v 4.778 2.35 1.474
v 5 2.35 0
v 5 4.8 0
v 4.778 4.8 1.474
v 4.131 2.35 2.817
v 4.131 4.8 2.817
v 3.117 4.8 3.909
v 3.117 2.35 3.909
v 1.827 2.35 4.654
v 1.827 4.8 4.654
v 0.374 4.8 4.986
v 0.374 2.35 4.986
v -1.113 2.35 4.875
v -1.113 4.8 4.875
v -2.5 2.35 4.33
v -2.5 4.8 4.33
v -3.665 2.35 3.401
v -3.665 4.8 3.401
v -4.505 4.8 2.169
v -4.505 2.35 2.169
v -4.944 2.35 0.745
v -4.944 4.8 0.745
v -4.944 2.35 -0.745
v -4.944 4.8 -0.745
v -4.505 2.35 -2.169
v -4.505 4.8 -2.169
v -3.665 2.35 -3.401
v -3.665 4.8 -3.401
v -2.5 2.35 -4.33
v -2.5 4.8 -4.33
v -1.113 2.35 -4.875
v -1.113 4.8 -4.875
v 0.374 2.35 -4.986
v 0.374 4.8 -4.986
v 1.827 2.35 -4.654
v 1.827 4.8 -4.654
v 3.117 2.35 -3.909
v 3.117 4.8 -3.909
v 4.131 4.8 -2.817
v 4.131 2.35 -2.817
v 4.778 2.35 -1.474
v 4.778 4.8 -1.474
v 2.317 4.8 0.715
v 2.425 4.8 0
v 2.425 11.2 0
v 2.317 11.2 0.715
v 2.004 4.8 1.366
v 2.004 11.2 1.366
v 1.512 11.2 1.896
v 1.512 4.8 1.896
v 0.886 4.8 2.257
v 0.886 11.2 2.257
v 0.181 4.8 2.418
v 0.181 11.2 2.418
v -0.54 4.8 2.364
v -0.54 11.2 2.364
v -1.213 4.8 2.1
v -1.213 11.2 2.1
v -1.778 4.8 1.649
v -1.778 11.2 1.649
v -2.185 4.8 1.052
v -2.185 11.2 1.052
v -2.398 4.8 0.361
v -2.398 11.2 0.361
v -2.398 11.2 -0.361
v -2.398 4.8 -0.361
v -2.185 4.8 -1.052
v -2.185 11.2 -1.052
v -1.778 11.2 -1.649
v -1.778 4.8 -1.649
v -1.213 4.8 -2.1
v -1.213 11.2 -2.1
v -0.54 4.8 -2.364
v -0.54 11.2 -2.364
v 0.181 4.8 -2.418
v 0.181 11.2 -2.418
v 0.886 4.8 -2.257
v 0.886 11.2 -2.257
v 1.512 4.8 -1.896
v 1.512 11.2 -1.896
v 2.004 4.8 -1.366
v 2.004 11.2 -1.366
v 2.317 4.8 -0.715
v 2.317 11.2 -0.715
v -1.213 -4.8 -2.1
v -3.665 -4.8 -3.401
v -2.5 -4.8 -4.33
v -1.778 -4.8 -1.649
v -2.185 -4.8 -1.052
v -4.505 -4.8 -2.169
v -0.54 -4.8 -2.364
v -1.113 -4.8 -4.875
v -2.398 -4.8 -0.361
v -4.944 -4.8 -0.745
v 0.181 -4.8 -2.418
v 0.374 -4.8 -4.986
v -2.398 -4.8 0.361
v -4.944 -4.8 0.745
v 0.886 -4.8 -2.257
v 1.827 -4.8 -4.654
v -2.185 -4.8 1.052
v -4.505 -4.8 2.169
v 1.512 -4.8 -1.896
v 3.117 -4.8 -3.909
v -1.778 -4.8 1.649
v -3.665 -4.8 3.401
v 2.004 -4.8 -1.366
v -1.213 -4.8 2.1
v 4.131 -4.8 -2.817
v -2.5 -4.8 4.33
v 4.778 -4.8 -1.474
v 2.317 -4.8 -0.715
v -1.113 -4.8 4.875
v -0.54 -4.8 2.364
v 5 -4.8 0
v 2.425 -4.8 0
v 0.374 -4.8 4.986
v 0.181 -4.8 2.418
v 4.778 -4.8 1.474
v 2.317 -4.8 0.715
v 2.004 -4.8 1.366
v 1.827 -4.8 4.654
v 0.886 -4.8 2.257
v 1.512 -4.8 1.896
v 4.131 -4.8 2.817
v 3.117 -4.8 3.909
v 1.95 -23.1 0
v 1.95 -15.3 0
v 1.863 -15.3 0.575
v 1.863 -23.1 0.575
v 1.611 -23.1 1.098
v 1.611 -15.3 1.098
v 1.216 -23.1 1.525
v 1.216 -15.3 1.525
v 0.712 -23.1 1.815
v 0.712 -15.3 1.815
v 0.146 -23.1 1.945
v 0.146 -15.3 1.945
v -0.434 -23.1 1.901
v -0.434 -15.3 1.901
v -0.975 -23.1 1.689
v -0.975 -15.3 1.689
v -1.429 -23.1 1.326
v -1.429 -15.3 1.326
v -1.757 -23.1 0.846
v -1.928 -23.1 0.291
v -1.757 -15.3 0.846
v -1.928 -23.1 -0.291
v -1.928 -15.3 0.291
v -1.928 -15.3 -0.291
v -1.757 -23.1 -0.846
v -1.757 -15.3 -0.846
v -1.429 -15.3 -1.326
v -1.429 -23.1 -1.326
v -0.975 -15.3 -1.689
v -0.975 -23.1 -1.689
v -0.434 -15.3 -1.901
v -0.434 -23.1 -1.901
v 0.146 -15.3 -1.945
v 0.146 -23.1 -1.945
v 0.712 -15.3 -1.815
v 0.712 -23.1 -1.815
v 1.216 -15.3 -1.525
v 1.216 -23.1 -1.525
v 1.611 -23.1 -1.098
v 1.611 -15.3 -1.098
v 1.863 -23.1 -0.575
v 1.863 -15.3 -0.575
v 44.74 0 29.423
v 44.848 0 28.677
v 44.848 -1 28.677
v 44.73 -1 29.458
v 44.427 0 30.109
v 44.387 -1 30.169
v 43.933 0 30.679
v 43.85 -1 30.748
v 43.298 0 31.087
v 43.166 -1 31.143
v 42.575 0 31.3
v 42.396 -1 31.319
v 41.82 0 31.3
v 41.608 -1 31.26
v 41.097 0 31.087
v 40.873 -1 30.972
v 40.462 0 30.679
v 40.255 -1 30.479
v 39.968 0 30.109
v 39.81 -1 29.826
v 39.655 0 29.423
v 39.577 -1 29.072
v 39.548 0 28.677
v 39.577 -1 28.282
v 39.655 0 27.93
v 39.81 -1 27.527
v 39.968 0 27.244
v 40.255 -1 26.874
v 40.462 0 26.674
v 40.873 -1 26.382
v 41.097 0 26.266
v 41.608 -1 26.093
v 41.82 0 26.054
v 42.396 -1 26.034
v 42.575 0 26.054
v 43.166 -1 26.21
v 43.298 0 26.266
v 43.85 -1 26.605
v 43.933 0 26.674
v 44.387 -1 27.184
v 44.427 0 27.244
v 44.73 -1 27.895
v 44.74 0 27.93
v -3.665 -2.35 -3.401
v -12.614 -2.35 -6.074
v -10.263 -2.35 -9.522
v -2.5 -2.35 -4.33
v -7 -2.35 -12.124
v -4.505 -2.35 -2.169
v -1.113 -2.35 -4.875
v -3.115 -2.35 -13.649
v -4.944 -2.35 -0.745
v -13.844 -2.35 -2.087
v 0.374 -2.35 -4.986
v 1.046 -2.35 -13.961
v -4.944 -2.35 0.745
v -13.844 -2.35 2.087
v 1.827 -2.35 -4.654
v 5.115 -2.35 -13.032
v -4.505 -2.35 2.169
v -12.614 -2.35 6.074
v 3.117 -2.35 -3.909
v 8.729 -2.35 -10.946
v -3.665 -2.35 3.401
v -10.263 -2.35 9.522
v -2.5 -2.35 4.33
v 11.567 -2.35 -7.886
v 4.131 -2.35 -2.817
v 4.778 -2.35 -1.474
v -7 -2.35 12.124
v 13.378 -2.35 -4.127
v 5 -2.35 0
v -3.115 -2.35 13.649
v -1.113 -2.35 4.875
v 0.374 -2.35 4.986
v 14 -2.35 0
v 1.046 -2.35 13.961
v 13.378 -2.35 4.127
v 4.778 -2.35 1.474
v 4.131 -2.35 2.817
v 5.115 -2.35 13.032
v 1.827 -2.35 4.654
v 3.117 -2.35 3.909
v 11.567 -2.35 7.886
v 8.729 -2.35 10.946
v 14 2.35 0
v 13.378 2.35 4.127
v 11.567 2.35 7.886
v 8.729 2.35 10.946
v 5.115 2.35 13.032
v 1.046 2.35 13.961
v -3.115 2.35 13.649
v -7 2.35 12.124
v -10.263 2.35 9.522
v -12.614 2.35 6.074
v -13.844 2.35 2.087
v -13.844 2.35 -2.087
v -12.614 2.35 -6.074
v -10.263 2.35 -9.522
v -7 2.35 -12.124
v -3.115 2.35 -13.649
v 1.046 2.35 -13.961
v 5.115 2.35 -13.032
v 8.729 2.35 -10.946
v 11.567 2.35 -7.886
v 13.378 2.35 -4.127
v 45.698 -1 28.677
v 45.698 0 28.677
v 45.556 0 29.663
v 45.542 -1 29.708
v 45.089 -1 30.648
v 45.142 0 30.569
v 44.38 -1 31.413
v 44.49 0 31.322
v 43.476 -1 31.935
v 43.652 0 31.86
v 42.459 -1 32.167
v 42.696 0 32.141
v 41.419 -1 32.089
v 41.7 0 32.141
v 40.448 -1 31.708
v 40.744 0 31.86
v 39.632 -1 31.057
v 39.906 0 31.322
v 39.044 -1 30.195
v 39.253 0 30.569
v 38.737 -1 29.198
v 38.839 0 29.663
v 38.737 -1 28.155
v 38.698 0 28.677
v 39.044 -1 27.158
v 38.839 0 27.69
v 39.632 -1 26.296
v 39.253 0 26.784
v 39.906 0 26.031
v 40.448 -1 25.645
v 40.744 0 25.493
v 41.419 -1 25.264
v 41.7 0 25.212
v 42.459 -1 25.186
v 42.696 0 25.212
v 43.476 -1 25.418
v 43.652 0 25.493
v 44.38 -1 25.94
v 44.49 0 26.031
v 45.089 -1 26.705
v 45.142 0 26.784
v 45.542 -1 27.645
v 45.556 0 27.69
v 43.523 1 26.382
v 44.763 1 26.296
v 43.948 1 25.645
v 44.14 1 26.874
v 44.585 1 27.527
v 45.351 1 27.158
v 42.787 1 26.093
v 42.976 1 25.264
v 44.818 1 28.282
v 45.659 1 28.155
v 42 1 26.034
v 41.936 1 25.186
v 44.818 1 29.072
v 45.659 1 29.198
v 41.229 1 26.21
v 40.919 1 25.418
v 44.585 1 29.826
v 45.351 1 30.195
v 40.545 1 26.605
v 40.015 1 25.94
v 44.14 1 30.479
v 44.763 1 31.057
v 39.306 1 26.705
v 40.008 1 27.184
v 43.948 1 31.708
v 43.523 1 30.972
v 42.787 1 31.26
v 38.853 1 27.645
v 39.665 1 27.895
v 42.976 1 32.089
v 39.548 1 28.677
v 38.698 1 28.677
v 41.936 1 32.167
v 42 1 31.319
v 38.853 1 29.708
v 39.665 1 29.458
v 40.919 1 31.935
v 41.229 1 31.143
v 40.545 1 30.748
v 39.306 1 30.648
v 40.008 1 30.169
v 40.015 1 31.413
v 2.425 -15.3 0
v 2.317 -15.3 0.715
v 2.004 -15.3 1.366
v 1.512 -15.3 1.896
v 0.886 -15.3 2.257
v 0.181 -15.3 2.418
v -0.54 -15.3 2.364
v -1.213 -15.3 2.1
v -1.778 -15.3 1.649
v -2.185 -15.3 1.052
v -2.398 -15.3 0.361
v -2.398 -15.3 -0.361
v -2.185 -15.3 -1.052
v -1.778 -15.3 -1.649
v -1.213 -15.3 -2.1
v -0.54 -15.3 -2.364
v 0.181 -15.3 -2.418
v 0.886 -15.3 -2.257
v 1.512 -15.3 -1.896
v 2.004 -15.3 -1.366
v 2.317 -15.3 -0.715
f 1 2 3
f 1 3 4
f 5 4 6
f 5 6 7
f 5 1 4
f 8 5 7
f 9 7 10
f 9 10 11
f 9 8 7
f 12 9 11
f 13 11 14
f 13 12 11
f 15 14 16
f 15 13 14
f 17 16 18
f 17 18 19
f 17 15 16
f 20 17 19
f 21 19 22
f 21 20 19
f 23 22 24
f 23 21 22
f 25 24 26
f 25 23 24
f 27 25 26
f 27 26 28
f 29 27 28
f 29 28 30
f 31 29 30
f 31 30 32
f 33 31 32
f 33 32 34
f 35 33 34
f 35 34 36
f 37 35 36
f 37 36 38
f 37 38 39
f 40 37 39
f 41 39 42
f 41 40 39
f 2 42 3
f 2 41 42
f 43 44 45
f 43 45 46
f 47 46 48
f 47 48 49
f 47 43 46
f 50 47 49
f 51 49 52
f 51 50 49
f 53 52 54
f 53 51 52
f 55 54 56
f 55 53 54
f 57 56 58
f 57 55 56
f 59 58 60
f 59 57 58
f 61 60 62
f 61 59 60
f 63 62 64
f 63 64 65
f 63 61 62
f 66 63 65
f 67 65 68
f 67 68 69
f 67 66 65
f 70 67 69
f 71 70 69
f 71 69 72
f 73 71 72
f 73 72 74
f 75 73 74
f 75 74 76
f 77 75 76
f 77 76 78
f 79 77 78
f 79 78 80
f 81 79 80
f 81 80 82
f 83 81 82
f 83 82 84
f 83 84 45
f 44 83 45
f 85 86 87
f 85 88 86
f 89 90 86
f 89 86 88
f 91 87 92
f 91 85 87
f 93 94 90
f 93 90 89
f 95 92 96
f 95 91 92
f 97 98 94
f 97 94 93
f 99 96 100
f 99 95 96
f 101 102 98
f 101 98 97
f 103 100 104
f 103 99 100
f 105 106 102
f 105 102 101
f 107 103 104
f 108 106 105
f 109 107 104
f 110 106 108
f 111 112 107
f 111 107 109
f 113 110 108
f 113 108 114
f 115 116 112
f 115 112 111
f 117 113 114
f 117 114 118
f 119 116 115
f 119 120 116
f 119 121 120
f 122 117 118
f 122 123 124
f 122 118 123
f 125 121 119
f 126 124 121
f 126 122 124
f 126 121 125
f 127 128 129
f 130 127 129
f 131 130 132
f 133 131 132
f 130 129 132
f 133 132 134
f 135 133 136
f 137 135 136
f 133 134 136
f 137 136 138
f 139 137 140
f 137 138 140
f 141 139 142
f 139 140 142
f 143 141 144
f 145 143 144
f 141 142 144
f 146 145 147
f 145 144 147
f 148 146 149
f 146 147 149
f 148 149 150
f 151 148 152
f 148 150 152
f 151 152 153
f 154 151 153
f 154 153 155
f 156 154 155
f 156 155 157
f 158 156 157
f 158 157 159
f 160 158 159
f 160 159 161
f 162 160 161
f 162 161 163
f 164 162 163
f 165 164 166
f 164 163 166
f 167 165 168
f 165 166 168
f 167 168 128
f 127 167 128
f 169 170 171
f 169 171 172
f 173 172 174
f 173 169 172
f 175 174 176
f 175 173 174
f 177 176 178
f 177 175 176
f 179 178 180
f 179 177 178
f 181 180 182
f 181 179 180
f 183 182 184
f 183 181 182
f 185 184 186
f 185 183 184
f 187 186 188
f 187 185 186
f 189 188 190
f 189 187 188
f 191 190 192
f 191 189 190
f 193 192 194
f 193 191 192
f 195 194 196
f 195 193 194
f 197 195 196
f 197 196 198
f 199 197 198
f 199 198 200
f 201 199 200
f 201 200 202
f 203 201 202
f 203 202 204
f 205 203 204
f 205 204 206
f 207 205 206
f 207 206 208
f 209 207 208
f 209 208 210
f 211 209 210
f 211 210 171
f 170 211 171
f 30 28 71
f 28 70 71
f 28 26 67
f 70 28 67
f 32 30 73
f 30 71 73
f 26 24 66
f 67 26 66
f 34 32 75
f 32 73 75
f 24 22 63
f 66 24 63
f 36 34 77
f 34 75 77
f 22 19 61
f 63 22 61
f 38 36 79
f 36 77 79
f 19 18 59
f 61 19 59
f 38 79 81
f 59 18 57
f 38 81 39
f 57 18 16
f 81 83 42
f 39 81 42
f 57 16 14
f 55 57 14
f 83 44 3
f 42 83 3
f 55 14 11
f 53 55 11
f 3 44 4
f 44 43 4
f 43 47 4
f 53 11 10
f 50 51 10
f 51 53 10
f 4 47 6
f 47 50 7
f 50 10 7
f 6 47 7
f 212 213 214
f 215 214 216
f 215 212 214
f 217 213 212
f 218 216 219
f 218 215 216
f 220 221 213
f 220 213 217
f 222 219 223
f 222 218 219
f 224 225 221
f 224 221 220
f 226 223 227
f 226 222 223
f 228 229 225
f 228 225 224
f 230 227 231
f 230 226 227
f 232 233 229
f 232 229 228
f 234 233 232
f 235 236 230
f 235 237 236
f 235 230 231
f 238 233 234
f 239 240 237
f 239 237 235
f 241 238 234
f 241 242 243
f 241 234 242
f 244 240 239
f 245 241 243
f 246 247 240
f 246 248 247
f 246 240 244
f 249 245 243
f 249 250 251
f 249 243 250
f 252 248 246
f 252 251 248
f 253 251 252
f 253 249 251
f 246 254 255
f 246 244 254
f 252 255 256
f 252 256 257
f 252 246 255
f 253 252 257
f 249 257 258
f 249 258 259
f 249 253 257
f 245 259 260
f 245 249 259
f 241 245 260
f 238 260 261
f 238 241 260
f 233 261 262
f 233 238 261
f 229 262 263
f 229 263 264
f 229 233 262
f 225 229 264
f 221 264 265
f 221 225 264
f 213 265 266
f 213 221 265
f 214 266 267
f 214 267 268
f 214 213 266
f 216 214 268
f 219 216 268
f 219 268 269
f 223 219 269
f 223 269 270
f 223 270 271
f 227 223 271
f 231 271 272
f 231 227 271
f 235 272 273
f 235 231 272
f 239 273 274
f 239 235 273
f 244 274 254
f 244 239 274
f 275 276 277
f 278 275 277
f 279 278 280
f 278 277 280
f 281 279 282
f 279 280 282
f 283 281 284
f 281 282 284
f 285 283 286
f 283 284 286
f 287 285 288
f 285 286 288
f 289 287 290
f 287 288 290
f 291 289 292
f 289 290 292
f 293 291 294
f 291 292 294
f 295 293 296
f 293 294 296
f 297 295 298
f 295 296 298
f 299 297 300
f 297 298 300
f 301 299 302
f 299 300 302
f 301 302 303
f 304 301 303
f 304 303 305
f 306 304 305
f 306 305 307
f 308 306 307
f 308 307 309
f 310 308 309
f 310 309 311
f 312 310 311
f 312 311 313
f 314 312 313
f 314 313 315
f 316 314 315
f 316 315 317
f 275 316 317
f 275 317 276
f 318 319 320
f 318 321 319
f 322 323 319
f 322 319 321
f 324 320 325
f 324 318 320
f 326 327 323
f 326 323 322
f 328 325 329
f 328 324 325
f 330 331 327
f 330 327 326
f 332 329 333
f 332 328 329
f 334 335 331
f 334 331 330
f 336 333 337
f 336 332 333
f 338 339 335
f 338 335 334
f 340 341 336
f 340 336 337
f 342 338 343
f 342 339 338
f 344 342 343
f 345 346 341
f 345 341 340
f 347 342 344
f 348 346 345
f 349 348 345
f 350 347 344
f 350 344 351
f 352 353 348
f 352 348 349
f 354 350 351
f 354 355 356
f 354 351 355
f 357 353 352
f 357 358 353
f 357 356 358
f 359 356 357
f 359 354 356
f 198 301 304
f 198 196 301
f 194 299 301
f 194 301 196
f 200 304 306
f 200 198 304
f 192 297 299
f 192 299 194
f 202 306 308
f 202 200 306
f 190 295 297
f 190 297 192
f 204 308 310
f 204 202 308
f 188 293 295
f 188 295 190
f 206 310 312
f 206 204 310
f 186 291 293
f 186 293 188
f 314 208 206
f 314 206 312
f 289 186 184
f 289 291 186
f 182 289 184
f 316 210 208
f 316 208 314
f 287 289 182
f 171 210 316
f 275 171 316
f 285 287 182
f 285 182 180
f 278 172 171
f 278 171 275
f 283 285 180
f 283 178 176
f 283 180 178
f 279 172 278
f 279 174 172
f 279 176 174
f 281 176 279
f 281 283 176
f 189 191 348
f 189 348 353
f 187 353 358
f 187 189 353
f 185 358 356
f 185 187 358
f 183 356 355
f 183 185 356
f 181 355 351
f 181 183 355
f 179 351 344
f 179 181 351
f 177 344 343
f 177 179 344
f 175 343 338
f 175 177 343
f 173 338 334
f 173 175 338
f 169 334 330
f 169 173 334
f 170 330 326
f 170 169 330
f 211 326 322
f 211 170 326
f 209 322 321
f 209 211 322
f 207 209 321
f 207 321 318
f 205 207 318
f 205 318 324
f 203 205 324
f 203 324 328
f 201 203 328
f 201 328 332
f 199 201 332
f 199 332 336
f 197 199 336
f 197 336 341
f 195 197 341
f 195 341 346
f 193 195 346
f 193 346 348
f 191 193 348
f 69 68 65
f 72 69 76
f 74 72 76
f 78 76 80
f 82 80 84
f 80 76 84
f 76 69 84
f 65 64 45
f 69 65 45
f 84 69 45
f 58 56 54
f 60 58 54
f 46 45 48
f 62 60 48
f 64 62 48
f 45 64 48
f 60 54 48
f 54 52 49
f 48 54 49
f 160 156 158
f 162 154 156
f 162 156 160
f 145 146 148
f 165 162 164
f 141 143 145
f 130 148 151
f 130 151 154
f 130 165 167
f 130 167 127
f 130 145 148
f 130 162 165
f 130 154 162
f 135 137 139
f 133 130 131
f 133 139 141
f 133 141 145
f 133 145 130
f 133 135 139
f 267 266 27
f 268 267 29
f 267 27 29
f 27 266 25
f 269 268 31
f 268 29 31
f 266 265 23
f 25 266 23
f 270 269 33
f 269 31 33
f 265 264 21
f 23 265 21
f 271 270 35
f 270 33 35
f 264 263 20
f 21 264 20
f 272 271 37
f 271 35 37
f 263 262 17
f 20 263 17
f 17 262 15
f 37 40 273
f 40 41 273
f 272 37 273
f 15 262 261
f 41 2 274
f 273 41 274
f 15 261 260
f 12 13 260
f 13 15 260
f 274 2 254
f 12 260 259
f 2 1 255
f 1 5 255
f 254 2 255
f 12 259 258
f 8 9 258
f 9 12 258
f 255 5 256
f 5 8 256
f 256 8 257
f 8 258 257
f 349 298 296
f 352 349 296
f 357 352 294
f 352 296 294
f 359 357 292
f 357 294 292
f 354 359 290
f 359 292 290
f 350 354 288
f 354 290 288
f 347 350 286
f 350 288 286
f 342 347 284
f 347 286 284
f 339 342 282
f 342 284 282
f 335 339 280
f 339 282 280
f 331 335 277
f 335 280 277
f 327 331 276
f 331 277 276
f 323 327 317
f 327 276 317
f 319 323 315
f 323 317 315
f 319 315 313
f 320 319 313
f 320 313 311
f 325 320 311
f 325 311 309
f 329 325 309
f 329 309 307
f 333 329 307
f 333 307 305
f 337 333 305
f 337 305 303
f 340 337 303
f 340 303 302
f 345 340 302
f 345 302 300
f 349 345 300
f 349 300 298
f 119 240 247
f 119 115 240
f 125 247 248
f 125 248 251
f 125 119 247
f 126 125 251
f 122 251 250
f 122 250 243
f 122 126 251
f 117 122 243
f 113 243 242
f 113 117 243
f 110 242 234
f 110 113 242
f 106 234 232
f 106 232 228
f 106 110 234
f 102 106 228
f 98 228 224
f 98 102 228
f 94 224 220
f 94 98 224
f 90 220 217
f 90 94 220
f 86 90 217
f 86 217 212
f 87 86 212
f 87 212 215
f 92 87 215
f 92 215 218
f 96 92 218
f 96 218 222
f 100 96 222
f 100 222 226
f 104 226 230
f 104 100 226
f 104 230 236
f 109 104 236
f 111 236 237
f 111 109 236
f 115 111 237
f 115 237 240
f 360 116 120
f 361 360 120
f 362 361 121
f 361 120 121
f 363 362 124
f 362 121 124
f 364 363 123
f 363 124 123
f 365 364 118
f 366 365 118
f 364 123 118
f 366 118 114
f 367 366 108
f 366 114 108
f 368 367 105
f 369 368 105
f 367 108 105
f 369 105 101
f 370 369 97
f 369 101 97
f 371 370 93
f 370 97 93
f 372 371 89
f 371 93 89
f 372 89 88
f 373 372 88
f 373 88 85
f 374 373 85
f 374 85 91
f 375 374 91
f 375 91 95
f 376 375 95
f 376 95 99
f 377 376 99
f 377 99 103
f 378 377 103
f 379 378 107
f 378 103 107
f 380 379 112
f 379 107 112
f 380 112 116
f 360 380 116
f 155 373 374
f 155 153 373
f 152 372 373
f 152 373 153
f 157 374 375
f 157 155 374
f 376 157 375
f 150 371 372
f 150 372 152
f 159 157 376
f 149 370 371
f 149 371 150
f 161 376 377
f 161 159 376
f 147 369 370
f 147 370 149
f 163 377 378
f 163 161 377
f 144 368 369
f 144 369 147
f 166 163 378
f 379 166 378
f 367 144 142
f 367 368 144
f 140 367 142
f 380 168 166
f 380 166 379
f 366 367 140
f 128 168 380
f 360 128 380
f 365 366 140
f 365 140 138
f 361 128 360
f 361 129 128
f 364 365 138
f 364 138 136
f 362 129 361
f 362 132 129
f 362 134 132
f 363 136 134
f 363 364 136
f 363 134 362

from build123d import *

# Parameters (mm, degrees)
F0_R          = 14
F1_DEPTH      = 2.35
F2_R          = 5
F3_DEPTH      = 4.8
F4_R          = 2.425
F5_DEPTH      = 10.5
F5_DEPTH_BACK = 16
F6_R          = 1.95
F7_DEPTH      = 7.8
F8_R          = 3.5
F8_R_2        = 2.65
F9_DEPTH      = 1
F10_R         = 3.5
F10_R_2       = 2.65
F11_DEPTH     = 1


with BuildPart() as f1:
    # F0 (on Front) → F1 (new body, symmetric)
    with BuildSketch(Plane.XZ):
        Circle(F0_R)
    extrude(amount=F1_DEPTH, both=True)

    # F2 (on Front) → F3 (join, symmetric)
    with BuildSketch(Plane.XZ):
        Circle(F2_R)
    extrude(amount=F3_DEPTH, both=True)

    # F4 (on face) → F5 (join, two sides)
    with BuildSketch(Plane.XZ.offset(4.8)) as f5_sk:
        Circle(F4_R)
    extrude(amount=F5_DEPTH)
    extrude(f5_sk.sketch, amount=-F5_DEPTH_BACK)

    # F6 (on face) → F7 (join)
    with BuildSketch(Plane.XZ.offset(15.3)):
        Circle(F6_R)
    extrude(amount=F7_DEPTH)


with BuildPart() as f9:
    # F8 (on Front) → F9 (new body)
    with BuildSketch(Plane.XZ):
        with Locations((42.197611, 28.676543)):
            Circle(F8_R)
        with Locations((42.197611, 28.676543)):
            Circle(F8_R_2, mode=Mode.SUBTRACT)
    extrude(amount=F9_DEPTH)

    # F10 (on face) → F11 (join)
    with BuildSketch(Plane(origin=(0, 0, 0), x_dir=(-1, 0, 0), z_dir=(0, 1, 0))):
        with Locations((-42.197611, 28.676543)):
            Circle(F10_R)
        with Locations((-42.197611, 28.676543)):
            Circle(F10_R_2, mode=Mode.SUBTRACT)
    extrude(amount=F11_DEPTH)


solid = Compound([f1.part, f9.part])
